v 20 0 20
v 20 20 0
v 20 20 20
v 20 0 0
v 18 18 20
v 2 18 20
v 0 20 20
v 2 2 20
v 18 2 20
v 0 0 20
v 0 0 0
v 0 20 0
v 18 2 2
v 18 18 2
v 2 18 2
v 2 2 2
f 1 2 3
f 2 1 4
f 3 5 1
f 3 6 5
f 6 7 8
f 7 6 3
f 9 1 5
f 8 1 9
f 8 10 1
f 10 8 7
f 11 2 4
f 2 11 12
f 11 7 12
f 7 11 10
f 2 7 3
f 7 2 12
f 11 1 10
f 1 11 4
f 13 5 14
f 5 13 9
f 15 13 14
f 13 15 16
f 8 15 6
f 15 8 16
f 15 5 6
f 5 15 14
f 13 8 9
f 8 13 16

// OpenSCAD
cubesize=[20,20,20];
walls=[2,2,2];

difference() {
    cube(cubesize);
    translate(walls) {
        cube(cubesize-[walls[0]*2,walls[1]*2,walls[2]]);
//        cube(cubesize-walls*2);
    }
}
